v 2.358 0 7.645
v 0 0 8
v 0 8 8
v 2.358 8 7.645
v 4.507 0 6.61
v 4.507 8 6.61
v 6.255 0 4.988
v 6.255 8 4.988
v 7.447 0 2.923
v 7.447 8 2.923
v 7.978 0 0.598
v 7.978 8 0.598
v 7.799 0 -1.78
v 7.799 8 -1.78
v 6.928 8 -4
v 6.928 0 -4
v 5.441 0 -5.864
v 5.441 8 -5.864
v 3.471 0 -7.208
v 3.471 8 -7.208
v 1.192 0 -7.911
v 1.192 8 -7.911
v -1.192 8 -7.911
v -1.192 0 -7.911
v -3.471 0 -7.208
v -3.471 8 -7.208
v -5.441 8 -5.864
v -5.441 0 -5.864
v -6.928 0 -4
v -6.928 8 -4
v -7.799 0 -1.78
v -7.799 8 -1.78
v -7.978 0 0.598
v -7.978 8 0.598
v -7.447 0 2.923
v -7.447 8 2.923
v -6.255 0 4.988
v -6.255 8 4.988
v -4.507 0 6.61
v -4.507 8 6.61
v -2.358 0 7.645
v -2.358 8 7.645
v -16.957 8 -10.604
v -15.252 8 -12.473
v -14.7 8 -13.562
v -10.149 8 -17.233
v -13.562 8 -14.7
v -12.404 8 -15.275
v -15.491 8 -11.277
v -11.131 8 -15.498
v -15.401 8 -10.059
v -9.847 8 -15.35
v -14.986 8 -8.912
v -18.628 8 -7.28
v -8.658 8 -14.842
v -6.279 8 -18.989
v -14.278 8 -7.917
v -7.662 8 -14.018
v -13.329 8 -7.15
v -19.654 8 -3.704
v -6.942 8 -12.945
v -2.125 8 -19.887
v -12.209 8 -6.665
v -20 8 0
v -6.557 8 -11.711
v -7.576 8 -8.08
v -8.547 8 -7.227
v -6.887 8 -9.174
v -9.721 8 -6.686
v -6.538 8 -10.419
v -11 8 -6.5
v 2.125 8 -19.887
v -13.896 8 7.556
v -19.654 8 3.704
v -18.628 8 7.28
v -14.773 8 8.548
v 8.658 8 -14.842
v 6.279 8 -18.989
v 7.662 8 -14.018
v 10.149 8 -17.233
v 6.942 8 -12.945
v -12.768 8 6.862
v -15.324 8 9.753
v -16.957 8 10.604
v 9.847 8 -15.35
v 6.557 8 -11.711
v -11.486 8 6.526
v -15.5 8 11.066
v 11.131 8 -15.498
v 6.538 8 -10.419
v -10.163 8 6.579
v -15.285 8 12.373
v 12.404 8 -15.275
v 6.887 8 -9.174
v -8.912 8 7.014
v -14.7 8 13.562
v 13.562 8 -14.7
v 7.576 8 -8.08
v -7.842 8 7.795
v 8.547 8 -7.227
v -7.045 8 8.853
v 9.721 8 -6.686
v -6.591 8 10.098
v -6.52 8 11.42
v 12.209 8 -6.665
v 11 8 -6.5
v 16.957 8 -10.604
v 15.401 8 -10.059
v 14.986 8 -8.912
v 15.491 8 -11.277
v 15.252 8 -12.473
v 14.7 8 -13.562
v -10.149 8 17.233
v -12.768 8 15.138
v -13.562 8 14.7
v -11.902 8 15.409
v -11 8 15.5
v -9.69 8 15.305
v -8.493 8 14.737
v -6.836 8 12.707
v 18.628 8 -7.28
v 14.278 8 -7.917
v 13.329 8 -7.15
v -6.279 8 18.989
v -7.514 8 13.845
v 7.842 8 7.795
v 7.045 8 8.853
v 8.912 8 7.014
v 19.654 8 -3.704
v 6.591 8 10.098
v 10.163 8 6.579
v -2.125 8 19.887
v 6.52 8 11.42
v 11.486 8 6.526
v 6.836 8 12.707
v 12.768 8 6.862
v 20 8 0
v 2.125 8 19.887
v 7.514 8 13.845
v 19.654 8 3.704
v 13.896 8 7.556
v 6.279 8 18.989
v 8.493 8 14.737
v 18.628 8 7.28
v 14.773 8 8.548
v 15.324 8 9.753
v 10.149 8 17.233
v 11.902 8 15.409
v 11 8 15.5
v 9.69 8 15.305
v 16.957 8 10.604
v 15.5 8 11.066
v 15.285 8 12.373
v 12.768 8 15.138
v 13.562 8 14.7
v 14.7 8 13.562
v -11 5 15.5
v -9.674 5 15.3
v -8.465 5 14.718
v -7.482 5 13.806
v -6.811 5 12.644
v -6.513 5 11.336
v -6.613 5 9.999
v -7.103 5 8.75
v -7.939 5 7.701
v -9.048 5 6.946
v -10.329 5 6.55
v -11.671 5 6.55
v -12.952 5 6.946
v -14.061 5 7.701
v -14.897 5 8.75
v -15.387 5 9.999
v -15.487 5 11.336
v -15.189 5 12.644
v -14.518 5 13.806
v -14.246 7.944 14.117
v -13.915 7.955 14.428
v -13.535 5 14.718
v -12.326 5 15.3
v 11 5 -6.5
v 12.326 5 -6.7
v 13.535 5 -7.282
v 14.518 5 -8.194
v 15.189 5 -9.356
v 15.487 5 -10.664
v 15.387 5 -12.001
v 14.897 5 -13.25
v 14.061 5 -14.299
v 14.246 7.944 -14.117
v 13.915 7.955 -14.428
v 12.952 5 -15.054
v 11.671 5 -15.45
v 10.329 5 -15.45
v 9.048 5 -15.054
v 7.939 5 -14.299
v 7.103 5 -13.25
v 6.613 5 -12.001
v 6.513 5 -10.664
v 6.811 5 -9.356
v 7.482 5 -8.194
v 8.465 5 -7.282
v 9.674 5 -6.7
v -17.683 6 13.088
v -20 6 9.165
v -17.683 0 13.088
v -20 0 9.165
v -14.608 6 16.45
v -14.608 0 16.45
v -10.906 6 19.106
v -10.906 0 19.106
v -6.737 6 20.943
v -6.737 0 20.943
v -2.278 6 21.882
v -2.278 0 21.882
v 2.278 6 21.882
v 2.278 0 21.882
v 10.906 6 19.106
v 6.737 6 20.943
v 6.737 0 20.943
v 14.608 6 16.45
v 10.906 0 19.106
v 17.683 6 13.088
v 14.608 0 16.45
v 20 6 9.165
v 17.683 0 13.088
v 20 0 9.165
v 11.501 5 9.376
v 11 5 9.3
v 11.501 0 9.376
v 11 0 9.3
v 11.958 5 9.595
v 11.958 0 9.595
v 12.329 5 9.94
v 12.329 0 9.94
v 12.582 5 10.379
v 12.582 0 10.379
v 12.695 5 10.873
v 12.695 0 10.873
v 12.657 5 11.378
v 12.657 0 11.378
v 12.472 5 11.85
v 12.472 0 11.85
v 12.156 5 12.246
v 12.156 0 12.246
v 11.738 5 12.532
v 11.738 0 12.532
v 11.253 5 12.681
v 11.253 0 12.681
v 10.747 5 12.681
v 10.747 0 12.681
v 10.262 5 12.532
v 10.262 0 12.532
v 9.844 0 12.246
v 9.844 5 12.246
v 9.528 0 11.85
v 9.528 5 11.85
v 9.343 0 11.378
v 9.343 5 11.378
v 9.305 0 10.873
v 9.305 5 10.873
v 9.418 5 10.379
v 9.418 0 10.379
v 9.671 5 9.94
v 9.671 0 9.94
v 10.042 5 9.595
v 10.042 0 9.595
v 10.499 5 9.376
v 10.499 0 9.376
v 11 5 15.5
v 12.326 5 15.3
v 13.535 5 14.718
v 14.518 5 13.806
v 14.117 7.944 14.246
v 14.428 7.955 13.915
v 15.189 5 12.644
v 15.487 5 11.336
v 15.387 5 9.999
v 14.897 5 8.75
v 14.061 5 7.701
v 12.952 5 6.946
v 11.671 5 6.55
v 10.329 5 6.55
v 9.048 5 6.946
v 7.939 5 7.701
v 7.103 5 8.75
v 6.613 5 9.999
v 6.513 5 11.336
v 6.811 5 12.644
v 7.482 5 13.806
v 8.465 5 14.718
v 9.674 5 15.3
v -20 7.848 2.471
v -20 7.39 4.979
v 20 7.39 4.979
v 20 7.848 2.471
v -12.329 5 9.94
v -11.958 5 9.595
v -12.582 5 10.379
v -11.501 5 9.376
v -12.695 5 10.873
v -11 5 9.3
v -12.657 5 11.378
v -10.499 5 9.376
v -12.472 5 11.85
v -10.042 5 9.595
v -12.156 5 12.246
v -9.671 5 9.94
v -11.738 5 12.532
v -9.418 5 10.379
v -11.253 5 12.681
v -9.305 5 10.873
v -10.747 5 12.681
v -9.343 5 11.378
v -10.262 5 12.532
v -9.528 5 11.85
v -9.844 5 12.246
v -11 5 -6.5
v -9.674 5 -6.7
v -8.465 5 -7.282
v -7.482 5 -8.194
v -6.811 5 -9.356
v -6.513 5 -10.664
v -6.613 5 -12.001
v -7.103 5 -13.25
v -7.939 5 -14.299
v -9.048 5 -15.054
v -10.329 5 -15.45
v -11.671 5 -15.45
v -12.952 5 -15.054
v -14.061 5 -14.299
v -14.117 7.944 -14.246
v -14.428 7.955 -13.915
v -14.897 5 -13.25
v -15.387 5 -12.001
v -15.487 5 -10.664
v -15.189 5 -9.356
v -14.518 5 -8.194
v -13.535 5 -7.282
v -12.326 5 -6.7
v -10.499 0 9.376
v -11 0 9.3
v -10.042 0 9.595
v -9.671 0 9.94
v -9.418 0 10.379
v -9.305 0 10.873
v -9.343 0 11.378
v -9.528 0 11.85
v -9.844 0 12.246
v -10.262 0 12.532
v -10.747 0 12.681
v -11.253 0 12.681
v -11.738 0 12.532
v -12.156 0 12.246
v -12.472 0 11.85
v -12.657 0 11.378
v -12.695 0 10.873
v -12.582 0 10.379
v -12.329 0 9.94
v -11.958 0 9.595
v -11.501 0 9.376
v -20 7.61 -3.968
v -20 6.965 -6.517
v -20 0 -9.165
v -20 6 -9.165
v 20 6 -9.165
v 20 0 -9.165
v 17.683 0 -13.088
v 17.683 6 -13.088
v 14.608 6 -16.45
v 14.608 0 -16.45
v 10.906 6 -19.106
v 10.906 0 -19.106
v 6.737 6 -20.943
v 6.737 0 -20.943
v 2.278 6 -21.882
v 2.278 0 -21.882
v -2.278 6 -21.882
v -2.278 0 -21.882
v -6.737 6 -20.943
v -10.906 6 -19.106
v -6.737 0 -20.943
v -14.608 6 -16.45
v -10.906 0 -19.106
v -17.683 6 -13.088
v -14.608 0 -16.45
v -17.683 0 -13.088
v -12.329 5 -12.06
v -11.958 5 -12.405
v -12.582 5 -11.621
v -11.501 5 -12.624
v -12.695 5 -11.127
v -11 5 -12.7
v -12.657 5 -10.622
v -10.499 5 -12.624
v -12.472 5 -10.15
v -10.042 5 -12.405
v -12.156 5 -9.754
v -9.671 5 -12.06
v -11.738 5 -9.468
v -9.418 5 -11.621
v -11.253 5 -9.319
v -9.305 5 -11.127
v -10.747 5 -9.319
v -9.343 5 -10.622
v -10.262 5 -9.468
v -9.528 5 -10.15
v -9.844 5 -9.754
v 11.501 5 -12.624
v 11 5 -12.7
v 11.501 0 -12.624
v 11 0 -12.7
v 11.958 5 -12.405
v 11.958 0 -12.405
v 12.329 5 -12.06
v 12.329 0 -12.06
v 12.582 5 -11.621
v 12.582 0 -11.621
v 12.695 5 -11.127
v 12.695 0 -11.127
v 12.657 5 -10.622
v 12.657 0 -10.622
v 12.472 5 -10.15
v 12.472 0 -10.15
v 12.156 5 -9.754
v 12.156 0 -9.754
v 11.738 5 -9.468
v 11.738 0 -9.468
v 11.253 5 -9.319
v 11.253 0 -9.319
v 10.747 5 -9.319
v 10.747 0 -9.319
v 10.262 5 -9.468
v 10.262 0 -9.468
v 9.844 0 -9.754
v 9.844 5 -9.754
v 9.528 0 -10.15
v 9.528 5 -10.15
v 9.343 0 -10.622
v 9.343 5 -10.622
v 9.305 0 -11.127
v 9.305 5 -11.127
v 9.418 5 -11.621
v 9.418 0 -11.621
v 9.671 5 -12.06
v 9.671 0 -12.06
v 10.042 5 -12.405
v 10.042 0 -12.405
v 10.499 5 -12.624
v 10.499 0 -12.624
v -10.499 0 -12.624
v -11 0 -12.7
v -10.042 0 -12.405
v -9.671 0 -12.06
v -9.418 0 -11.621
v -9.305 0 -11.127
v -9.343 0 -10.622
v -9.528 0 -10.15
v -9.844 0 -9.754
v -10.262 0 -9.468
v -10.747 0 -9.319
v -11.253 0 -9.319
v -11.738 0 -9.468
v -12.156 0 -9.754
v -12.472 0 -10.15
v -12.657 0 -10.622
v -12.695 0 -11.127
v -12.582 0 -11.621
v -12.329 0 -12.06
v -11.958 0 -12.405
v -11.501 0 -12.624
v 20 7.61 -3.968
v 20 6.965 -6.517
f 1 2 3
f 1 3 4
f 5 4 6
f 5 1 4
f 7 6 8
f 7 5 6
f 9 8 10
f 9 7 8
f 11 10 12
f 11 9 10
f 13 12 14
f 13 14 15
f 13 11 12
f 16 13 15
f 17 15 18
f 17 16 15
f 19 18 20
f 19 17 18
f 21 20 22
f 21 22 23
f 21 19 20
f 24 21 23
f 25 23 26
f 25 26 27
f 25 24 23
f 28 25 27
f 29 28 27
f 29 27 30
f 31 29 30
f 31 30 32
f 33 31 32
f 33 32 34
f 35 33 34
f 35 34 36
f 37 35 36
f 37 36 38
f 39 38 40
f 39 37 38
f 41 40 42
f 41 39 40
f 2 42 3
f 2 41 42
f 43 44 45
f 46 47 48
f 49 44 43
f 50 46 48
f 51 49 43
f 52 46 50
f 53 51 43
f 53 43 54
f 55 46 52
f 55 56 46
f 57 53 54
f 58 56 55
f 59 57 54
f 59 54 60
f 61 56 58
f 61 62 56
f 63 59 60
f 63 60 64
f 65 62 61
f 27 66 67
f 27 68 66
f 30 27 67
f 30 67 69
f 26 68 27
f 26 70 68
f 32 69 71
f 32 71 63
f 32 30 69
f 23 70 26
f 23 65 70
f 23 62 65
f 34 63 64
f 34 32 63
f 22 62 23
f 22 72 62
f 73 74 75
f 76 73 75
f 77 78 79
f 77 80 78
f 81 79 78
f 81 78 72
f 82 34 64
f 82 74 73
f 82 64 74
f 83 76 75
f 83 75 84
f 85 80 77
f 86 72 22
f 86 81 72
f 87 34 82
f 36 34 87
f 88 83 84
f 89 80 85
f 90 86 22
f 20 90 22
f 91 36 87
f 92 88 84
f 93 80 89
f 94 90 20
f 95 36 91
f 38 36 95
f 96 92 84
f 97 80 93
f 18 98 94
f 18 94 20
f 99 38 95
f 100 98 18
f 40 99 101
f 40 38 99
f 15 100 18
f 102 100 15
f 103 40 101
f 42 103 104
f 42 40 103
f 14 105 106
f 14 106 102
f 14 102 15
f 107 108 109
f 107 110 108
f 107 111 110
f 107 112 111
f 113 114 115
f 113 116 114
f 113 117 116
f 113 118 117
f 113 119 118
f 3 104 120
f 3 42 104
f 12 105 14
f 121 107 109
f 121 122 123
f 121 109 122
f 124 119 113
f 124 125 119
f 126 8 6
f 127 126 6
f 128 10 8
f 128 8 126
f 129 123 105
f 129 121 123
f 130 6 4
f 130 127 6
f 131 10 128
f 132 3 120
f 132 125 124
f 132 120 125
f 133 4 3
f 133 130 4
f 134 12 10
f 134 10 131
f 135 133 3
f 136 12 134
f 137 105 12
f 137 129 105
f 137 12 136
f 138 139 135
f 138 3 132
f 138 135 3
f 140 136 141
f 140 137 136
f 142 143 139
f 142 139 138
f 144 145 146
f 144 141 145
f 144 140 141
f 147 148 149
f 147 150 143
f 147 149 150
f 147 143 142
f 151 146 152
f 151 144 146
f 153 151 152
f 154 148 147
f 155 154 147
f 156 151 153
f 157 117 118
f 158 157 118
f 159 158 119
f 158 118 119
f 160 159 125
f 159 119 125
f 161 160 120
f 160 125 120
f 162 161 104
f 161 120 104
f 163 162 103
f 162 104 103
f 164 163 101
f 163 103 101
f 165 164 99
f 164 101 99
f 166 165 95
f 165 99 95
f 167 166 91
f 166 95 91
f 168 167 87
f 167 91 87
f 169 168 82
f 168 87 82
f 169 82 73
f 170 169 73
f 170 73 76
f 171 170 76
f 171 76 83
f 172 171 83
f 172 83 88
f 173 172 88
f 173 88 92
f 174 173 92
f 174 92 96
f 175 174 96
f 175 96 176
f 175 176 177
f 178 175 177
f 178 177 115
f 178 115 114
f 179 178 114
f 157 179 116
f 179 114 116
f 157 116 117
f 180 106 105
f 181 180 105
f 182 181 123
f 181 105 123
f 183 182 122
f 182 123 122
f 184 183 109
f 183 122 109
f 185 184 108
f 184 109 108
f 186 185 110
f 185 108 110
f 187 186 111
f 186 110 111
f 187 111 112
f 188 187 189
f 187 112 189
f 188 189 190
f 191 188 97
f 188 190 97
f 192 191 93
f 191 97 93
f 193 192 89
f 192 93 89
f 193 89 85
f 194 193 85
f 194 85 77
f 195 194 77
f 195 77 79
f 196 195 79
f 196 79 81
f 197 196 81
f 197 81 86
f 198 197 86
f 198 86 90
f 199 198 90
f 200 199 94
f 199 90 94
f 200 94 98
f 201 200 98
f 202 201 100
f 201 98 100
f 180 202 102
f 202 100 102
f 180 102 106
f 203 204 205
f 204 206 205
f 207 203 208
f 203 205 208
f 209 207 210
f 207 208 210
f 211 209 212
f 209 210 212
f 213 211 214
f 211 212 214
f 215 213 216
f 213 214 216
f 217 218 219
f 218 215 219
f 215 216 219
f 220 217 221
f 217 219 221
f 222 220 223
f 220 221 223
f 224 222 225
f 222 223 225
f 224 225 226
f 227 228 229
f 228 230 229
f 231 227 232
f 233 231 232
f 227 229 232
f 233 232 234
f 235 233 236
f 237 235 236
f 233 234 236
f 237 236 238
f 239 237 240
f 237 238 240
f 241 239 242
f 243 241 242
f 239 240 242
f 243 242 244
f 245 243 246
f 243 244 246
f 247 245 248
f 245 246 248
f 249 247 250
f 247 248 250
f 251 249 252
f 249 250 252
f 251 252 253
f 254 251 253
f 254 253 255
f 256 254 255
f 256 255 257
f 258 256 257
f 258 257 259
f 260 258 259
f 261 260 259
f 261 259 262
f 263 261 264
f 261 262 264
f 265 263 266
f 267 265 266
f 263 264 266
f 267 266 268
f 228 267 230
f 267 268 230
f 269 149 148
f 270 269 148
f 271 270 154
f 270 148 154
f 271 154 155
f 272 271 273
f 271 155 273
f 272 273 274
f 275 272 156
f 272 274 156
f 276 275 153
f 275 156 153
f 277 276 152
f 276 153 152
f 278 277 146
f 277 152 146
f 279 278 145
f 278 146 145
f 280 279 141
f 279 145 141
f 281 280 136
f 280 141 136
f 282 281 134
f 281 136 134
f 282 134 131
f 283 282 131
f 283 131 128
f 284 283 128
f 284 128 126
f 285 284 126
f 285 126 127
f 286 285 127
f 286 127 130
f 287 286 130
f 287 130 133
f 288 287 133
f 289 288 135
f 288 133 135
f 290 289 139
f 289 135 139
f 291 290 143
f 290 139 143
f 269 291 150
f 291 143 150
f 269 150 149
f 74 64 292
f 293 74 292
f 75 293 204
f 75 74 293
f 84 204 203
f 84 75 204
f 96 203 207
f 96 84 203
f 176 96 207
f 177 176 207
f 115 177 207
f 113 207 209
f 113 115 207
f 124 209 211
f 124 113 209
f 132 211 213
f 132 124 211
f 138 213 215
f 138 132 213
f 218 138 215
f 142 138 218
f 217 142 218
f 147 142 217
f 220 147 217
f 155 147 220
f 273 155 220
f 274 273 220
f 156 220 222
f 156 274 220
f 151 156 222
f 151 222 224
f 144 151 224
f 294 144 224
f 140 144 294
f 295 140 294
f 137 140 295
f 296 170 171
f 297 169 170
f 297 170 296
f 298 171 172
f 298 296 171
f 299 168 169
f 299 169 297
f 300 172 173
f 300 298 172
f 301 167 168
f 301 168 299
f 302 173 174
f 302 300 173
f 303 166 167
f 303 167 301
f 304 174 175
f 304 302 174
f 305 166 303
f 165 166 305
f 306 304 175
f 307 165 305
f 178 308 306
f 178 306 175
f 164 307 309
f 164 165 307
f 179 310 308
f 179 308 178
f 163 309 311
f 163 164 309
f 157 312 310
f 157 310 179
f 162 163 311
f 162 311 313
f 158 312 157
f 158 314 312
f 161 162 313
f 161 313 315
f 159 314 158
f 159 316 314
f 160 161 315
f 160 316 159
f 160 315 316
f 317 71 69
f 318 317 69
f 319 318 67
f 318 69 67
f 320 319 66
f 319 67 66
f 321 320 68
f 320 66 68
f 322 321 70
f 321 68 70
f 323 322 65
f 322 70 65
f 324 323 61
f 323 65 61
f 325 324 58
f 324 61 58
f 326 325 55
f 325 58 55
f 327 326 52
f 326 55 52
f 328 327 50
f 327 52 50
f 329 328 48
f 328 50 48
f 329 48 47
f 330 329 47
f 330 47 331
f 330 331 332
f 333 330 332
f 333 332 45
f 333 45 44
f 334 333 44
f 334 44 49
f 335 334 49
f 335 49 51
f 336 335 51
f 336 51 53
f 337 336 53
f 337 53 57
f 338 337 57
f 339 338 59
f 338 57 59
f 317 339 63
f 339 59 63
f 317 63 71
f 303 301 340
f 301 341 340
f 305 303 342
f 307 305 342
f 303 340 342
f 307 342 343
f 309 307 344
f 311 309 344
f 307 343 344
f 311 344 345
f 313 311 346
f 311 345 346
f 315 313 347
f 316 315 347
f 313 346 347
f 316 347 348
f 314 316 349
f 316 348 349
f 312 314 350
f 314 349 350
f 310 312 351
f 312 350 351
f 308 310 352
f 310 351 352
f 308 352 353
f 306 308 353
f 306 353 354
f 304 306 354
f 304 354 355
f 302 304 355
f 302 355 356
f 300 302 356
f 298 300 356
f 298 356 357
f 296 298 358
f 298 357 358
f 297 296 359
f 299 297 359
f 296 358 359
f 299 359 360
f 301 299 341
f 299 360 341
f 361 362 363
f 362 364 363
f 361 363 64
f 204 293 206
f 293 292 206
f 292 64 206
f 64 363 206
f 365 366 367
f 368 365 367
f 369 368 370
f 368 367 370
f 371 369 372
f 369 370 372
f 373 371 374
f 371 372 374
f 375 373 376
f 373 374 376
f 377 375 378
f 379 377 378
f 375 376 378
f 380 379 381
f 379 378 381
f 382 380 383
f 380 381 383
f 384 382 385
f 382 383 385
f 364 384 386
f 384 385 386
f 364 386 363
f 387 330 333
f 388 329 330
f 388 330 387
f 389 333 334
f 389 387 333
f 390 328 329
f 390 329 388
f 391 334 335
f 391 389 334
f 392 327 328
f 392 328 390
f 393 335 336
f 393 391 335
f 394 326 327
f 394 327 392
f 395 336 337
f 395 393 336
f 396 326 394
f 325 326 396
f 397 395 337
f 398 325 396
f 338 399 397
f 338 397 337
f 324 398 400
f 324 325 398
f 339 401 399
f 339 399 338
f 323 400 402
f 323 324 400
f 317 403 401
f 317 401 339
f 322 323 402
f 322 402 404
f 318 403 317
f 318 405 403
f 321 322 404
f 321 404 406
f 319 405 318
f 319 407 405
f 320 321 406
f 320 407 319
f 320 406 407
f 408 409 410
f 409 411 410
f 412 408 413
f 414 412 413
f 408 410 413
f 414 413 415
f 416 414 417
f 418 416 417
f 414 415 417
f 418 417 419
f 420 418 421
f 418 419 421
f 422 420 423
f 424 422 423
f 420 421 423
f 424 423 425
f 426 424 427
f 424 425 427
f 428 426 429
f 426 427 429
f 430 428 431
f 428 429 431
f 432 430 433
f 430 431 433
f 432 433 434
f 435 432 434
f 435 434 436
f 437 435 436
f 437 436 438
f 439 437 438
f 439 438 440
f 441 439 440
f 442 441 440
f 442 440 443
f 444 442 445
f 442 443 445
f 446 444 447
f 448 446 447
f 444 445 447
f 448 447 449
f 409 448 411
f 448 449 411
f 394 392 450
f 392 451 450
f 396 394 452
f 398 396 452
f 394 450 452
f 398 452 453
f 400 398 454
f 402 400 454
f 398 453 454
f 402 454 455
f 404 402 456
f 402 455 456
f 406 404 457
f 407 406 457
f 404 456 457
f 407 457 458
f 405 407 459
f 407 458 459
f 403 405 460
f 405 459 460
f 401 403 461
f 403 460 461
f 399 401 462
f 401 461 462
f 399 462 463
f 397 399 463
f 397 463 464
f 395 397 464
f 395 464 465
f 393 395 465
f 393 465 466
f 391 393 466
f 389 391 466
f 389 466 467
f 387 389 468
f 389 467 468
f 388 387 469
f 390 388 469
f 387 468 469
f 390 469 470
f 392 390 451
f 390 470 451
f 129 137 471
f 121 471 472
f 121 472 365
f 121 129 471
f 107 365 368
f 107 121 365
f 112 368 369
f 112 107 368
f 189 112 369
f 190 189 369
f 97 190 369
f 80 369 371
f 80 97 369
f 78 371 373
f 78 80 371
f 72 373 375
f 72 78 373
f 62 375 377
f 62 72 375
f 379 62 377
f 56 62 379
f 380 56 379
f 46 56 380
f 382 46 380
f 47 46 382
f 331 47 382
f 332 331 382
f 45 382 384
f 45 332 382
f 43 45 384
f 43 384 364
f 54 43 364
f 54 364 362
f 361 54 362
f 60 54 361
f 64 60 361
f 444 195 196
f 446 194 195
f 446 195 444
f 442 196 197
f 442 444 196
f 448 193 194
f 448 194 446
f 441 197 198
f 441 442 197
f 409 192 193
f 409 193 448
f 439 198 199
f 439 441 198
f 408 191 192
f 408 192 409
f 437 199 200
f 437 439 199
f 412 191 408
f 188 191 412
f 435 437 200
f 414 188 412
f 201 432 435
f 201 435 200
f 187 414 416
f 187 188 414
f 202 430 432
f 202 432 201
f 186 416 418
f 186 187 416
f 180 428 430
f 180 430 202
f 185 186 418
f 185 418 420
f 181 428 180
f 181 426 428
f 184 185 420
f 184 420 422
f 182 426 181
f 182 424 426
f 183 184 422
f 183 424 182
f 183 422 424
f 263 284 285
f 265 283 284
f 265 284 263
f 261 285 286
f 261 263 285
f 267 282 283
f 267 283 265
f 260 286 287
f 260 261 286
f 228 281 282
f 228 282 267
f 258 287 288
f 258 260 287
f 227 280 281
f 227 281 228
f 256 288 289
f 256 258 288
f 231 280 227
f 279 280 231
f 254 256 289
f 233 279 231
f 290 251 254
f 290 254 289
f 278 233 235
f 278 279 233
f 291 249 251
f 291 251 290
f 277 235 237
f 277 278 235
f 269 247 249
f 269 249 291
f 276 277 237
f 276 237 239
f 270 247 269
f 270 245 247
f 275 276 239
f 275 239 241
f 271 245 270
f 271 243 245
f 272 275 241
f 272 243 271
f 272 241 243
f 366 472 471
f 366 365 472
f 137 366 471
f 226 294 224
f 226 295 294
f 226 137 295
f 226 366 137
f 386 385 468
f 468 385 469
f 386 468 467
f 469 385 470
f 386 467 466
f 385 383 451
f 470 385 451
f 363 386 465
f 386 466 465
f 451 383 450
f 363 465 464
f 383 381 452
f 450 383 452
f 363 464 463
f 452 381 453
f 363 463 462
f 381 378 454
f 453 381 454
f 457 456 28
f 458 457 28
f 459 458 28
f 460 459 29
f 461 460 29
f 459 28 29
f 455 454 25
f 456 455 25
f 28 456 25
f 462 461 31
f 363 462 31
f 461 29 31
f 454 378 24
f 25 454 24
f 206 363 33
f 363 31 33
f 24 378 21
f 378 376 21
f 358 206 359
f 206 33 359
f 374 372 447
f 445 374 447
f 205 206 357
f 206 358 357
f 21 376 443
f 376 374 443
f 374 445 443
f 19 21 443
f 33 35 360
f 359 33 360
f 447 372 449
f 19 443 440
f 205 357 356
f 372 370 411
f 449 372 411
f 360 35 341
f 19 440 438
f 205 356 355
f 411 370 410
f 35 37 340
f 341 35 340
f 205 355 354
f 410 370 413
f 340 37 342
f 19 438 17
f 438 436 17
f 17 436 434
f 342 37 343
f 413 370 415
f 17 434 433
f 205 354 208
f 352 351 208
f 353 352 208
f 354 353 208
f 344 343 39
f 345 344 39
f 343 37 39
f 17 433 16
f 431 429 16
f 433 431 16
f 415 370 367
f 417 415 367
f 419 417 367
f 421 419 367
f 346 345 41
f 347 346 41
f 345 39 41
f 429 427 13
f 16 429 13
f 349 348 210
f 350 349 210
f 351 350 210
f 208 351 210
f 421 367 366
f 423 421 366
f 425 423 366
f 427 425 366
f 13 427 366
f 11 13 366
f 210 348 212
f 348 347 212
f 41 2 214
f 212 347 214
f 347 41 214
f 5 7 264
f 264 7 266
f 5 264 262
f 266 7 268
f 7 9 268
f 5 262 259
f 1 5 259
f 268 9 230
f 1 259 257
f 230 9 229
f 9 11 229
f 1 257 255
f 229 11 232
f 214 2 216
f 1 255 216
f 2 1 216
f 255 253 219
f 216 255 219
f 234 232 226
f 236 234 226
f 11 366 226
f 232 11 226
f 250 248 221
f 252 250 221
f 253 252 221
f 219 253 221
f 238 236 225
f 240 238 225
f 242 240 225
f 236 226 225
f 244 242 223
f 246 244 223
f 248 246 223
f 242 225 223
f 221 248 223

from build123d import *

# Parameters (mm, degrees)
SKETCH1_R                               = 22
SKETCH1_R_2                             = 8
EXTRUDE1_DEPTH                          = 8
CHAMFER1_SIZE                           = 2
CBORE_FOR_M3_HEX_HEAD_BOLT1_D           = 3.4
CBORE_FOR_M3_HEX_HEAD_BOLT1_DEPTH       = 10.1
CBORE_FOR_M3_HEX_HEAD_BOLT1_CBORE_D     = 9
CBORE_FOR_M3_HEX_HEAD_BOLT1_CBORE_DEPTH = 3
CBORE_FOR_M3_HEX_HEAD_BOLT1_TIP         = 1.021463052
SKETCH4_OUTSIDE_W                       = 58.548
SKETCH4_OUTSIDE_H                       = 58.548
SKETCH4_OUTSIDE_W_2                     = 40
SKETCH4_OUTSIDE_H_2                     = 54.265232974
EXTRUDE2_DEPTH                          = 30


with BuildPart() as part:
    # Sketch1 → Extrude1 (new body)
    with BuildSketch(Plane(origin=(0, 0, 0), x_dir=(1, 0, 0), z_dir=(0, 1, 0))):
        with Locations(Location((0, 0, 0), (0, 0, 270))):
            Circle(SKETCH1_R)
        with Locations(Location((0, 0, 0), (0, 0, 270))):
            Circle(SKETCH1_R_2, mode=Mode.SUBTRACT)
    extrude(amount=EXTRUDE1_DEPTH)

    # Chamfer1
    chamfer1_edges = [part.edges().sort_by_distance(p)[0] for p in [
        (0, 8, -22),
    ]]
    chamfer(chamfer1_edges, length=CHAMFER1_SIZE)

    # CBORE for M3 Hex Head Bolt1
    with Locations(Plane(origin=(-11, 8, -11), x_dir=(0, 0, 1), z_dir=(0, 1, 0))):
        with Locations((0, 0), (0, 22), (22, 22), (22, 0)):
            CounterBoreHole(CBORE_FOR_M3_HEX_HEAD_BOLT1_D / 2, CBORE_FOR_M3_HEX_HEAD_BOLT1_CBORE_D / 2, CBORE_FOR_M3_HEX_HEAD_BOLT1_CBORE_DEPTH, depth=CBORE_FOR_M3_HEX_HEAD_BOLT1_DEPTH)
            with Locations((0, 0, -(CBORE_FOR_M3_HEX_HEAD_BOLT1_DEPTH + CBORE_FOR_M3_HEX_HEAD_BOLT1_TIP / 2))):  # 118° drill point
                Cone(0, CBORE_FOR_M3_HEX_HEAD_BOLT1_D / 2, CBORE_FOR_M3_HEX_HEAD_BOLT1_TIP, mode=Mode.SUBTRACT)

    # Sketch4 outside → Extrude2 (cut)
    with BuildSketch(Plane.XZ):
        Rectangle(SKETCH4_OUTSIDE_W, SKETCH4_OUTSIDE_H)
        Rectangle(SKETCH4_OUTSIDE_W_2, SKETCH4_OUTSIDE_H_2, mode=Mode.SUBTRACT)
    extrude(amount=-EXTRUDE2_DEPTH, mode=Mode.SUBTRACT)


solid = part.part
